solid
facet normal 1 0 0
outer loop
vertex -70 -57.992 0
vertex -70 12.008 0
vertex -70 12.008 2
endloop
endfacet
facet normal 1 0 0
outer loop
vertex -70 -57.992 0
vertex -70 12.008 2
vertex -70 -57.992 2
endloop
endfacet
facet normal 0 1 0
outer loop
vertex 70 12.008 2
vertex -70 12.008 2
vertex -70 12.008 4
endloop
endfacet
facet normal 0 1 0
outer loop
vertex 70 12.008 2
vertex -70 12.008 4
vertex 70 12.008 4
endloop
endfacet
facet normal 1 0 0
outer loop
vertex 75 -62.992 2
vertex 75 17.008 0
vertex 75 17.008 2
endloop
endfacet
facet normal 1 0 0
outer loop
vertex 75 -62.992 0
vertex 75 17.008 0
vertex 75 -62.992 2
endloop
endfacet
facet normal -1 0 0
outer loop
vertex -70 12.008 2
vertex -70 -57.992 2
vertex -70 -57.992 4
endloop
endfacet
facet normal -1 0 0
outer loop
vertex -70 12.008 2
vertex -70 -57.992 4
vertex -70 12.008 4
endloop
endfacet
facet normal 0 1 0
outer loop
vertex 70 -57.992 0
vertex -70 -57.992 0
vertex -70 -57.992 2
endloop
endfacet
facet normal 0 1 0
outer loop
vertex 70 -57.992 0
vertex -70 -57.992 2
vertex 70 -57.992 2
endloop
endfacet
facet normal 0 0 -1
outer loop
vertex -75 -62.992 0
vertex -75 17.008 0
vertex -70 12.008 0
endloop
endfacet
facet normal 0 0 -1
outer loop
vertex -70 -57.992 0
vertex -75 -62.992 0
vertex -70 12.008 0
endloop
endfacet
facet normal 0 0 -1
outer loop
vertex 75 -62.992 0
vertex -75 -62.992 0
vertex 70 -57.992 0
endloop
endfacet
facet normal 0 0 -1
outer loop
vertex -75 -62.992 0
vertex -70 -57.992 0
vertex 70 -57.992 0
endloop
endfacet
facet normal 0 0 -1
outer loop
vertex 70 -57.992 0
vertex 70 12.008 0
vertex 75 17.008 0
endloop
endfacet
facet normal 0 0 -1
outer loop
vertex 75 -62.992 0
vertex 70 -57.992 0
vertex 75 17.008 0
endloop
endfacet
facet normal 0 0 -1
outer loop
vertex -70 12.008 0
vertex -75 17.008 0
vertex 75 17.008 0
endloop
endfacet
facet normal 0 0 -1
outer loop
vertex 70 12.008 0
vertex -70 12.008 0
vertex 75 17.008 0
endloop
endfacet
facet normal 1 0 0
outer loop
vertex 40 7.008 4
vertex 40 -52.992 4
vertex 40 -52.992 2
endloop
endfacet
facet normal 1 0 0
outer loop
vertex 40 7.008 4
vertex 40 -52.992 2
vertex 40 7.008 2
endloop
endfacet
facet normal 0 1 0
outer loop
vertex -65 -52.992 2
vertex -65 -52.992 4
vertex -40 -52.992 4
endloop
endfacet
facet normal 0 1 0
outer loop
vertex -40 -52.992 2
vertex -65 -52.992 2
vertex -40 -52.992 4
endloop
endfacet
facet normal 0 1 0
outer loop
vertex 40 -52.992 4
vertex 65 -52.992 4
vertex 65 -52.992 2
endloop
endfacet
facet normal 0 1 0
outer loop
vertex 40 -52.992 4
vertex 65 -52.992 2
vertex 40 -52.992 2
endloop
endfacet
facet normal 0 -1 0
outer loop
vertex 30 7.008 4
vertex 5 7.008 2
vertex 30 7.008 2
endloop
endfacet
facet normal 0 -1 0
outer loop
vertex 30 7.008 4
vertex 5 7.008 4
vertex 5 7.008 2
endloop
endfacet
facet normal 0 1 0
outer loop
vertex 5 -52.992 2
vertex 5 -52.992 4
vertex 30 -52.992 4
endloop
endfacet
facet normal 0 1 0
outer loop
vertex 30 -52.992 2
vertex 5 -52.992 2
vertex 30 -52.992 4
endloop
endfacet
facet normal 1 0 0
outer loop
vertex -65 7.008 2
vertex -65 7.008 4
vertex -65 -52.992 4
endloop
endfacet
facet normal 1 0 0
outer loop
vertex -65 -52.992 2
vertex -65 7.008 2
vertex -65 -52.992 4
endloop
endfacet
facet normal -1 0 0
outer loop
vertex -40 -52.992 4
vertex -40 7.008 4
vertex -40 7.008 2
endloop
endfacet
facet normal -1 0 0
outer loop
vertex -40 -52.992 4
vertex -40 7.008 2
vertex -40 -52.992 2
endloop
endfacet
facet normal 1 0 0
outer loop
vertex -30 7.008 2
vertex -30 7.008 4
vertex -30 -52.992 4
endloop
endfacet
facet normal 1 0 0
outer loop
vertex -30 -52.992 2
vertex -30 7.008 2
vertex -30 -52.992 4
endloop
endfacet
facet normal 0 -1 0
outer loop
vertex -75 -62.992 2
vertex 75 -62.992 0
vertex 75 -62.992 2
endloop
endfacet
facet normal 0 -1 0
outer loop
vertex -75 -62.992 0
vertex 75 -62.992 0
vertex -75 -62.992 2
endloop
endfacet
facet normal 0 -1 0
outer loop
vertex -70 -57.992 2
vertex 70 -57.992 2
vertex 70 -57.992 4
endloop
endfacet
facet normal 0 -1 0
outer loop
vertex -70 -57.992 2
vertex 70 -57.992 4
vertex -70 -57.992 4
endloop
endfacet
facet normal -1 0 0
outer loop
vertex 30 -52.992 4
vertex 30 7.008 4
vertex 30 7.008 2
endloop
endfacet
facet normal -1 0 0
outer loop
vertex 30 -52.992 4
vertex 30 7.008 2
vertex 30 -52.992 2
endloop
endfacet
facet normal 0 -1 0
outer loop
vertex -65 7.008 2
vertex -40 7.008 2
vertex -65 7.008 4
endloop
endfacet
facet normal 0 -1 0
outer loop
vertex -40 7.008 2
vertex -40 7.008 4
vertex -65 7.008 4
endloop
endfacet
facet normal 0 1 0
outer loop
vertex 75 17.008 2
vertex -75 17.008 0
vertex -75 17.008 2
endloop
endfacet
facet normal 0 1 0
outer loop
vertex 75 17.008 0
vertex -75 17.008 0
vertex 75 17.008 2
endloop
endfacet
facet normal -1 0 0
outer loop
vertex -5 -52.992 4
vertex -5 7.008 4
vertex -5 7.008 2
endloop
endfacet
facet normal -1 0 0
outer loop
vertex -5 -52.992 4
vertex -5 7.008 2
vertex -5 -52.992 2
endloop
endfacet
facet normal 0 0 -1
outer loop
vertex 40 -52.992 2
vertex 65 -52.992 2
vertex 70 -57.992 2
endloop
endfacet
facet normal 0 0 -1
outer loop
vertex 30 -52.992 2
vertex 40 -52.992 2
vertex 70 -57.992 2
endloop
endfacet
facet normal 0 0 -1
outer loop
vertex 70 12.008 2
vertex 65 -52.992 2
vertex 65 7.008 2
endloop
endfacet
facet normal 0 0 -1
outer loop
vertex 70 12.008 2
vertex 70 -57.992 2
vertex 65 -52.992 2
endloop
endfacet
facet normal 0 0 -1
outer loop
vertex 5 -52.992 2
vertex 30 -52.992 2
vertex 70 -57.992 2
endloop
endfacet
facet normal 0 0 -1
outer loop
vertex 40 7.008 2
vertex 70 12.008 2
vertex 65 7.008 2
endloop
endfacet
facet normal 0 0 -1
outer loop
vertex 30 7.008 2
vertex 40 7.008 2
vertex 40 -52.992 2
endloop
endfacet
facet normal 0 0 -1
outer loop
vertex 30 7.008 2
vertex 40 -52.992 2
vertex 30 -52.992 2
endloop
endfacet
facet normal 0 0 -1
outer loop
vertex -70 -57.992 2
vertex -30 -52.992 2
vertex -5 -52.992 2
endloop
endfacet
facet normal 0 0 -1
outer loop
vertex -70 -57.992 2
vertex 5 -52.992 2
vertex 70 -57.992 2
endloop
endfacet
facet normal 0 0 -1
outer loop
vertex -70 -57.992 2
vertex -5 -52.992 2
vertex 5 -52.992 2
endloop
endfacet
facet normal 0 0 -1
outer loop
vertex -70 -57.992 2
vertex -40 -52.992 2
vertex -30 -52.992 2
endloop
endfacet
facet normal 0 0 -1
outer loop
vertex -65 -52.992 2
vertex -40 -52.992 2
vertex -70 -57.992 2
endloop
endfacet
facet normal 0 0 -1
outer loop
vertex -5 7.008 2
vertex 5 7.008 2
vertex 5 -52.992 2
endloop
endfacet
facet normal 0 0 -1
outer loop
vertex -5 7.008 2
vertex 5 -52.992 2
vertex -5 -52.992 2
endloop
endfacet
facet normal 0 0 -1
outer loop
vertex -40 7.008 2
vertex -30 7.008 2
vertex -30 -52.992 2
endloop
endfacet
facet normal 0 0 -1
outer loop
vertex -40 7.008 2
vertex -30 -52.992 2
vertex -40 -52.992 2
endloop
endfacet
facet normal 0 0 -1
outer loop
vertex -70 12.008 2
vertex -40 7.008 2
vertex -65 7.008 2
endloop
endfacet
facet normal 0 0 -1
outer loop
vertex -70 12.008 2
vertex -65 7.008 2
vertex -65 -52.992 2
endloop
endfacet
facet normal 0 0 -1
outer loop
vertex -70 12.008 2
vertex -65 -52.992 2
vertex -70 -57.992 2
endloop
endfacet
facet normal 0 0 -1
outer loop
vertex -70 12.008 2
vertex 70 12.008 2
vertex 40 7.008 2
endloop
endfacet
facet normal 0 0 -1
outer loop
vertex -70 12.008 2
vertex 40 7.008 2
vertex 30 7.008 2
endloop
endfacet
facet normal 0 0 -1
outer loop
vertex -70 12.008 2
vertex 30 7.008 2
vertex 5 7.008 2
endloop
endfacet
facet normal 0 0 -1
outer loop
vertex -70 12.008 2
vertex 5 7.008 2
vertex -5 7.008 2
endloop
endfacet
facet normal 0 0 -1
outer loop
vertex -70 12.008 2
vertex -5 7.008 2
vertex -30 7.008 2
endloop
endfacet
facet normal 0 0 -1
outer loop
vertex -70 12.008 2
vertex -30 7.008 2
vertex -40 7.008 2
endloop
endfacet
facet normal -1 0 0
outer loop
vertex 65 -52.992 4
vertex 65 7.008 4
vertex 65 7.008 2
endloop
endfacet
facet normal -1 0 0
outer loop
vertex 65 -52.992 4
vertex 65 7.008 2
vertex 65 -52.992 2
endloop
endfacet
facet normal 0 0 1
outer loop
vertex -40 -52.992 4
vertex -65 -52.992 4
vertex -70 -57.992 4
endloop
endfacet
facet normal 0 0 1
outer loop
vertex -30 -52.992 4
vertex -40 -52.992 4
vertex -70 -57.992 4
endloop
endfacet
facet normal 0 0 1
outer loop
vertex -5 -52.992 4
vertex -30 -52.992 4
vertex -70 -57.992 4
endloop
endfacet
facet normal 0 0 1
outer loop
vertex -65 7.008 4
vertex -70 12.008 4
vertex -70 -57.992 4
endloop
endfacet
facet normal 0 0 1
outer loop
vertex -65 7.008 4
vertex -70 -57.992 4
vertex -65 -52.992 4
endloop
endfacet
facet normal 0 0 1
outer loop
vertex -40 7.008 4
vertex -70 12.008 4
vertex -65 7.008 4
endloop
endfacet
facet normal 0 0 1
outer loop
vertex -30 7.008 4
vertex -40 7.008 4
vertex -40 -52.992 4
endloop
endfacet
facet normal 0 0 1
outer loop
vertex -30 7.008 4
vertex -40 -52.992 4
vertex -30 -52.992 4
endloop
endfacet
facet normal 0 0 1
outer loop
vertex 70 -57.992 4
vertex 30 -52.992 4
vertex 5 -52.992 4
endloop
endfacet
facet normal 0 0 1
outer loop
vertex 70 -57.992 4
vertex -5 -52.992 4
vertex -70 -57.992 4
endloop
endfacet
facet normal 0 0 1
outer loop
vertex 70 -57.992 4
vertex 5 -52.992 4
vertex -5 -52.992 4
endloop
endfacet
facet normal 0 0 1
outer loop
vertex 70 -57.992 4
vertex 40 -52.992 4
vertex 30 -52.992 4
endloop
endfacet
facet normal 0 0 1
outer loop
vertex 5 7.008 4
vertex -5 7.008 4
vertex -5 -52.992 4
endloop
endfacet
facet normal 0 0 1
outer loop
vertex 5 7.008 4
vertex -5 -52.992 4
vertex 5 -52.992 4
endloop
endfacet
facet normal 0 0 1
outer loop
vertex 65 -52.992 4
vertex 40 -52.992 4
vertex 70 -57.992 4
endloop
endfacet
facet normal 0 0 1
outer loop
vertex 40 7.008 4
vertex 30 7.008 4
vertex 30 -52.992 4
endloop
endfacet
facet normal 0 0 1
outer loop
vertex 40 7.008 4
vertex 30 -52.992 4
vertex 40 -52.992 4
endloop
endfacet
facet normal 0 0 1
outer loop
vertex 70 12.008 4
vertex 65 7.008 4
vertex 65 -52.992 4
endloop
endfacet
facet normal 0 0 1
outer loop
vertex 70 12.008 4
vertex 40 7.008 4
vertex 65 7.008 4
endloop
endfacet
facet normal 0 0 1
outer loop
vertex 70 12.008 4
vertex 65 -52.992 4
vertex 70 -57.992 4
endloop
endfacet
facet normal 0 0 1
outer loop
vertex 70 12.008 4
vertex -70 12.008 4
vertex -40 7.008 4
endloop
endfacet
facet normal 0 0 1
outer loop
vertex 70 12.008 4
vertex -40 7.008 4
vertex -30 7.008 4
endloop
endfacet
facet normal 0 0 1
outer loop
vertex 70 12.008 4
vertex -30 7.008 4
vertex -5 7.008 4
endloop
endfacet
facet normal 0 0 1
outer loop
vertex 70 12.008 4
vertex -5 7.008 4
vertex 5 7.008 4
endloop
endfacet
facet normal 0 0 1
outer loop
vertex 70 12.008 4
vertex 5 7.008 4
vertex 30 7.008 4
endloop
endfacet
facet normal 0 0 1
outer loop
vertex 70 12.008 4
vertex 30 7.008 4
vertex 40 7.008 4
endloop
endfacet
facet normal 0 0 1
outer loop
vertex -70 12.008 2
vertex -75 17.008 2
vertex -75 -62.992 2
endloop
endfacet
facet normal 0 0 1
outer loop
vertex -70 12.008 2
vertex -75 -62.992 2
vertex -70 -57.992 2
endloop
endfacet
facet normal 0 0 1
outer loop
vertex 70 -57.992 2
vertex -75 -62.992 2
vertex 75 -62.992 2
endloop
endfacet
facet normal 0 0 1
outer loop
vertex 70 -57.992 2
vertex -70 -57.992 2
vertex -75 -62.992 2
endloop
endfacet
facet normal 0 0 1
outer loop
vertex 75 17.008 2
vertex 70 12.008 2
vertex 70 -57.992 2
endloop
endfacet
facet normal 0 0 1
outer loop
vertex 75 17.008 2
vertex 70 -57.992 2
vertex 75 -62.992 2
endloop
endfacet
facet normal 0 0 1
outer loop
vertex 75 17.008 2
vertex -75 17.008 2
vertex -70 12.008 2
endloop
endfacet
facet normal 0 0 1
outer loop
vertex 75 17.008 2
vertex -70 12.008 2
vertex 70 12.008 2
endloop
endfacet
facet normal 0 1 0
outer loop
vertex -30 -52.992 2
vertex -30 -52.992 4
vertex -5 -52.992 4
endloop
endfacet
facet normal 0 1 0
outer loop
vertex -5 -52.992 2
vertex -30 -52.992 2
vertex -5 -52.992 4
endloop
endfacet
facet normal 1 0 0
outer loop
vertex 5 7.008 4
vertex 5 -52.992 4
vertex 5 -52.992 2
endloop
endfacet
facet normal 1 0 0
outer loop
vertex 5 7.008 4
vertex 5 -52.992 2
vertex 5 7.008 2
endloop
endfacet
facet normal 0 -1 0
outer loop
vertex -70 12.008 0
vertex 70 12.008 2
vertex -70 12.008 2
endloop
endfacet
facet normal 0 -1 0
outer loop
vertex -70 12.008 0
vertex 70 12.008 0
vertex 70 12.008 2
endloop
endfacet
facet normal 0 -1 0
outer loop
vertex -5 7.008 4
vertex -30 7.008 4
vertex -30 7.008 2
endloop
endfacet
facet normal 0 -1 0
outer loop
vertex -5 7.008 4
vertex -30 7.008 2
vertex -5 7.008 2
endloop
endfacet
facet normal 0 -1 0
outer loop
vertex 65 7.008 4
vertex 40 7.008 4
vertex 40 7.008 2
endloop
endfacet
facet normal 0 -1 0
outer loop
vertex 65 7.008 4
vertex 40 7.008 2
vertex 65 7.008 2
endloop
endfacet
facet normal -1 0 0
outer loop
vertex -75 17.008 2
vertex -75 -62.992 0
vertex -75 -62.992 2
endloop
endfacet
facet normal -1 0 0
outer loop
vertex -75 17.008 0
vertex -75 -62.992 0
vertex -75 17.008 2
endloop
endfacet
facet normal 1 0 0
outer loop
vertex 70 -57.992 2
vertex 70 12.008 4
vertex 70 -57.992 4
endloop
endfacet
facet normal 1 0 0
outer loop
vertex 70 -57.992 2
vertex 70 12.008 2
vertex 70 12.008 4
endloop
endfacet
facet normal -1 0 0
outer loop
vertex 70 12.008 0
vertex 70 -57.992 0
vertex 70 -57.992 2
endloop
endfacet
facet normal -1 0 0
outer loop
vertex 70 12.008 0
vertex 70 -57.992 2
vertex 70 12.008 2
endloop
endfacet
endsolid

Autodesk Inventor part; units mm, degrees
ref_plane "YZ Plane" through (0, 0, 0) normal (1, 0, 0) x (0, 1, 0)
ref_plane "XZ Plane" through (0, 0, 0) normal (0, 1, 0) x (-1, 0, 0)
ref_plane "XY Plane" through (0, 0, 0) normal (0, 0, 1) x (1, 0, 0)
sketch "Skizze1" plane through (0, 0, 0) normal (0, 0, 1) x (1, 0, 0)
  line L0 (0, -78.9916) -> (0, 33.0084) projected
  line L1 (-75, 17.0084) -> (75, 17.0084)
  line L2 (75, 17.0084) -> (75, -62.9916)
  line L3 (75, -62.9916) -> (-75, -62.9916)
  line L4 (-75, -62.9916) -> (-75, 17.0084)
  point P0 (0, 0)
  dimension "d0" = 150
  dimension "d1" = 80
extrude "Extrusion1" add sketch "Skizze1" along normal blind 2
sketch "Skizze2" plane through (0, 0, 2) normal (0, 0, 1) x (1, 0, 0)
  line L0 (-70, 12.0084) -> (70, 12.0084)
  line L1 (70, 12.0084) -> (70, -57.9916)
  line L2 (70, -57.9916) -> (-70, -57.9916)
  line L3 (-70, -57.9916) -> (-70, 12.0084)
  line L4 (75, 17.0084) -> (-75, 17.0084) projected
  line L5 (75, -62.9916) -> (75, 17.0084) projected
  point P0 (0, 0)
  dimension "d4" = 70
  dimension "d5" = 140
  dimension "d6" = 5
  dimension "d7" = 5
extrude "Extrusion2" add sketch "Skizze2" along normal blind 2
sketch "Skizze3" plane through (0, 0, 4) normal (0, 0, 1) x (1, 0, 0)
  line L0 (70, 12.0084) -> (-70, 12.0084) projected
  line L1 (-40, 12.0084) -> (-40, -57.9916)
  line L2 (-40, -57.9916) -> (-30, -57.9916)
  line L3 (-70, -57.9916) -> (70, -57.9916) projected
  line L4 (-40, 12.0084) -> (-30, 12.0084)
  line L5 (-30, 12.0084) -> (-30, -57.9916)
  line L6 (-5, -57.9916) -> (5, -57.9916)
  line L7 (5, -57.9916) -> (5, 12.0084)
  line L8 (5, 12.0084) -> (-5, 12.0084)
  line L9 (-5, 12.0084) -> (-5, -57.9916)
  line L10 (39.912, -57.9916) -> (40, -57.9916)
  line L11 (40, -57.9916) -> (40, 12.0084)
  line L12 (40, 12.0084) -> (30, 12.0084)
  line L13 (30, 12.0084) -> (30, -57.9916)
  line L14 (-70, 12.0084) -> (-70, -57.9916) projected
  line L15 (70, -57.9916) -> (70, 12.0084) projected
  line L16 (30, -57.9916) -> (40, -57.9916)
  line L17 (40, 7.0084) -> (65, 7.0084)
  line L18 (65, 7.0084) -> (65, -52.9916)
  line L19 (65, -52.9916) -> (40, -52.9916)
  line L20 (-40, 7.0084) -> (-65, 7.0084)
  line L21 (-65, 7.0084) -> (-65, -52.9916)
  line L22 (-65, -52.9916) -> (-40, -52.9916)
  line L23 (-40, 7.0084) -> (40, 7.0084)
  line L24 (-40, -52.9916) -> (40, -52.9916)
  point P0 (0, 0)
  point P1 (5, -52.9916)
  point P2 (30, -52.9916)
  point P3 (30, 7.0084)
  point P4 (5, 7.0084)
  point P5 (-30, -52.9916)
  point P6 (-5, -52.9916)
  point P7 (-5, 7.0084)
  point P8 (-30, 7.0084)
  dimension "d12" = 10
  dimension "d13" = 10
  dimension "d14" = 10
  dimension "d15" = 30
  dimension "d16" = 30
  dimension "d17" = 25
  dimension "d18" = 5
  dimension "d19" = 5
  dimension "d20" = 5
  dimension "d21" = 5
  dimension "d22" = 5
  dimension "d23" = 5
extrude "Extrusion3" cut sketch "Skizze3" against normal blind 5 contours L17 L18 L19 L11 | L13 L24 L7 L23 | L9 L24 L5 L23 | L1 L22 L21 L20
sketch "Skizze4" plane through (0, 0, 0) normal (0, 0, -1) x (-1, 0, 0)
  line L0 (-70, -57.9916) -> (-70, 12.0084) projected
  line L1 (70, 12.0084) -> (70, -57.9916) projected
  line L2 (-70, 12.0084) -> (70, 12.0084)
  line L3 (70, 12.0084) -> (70, -57.9916)
  line L4 (70, -57.9916) -> (-70, -57.9916)
  line L5 (-70, -57.9916) -> (-70, 12.0084)
  point P0 (0, 0)
extrude "Extrusion4" cut sketch "Skizze4" against normal blind 2
properties part number "Belüftung"
